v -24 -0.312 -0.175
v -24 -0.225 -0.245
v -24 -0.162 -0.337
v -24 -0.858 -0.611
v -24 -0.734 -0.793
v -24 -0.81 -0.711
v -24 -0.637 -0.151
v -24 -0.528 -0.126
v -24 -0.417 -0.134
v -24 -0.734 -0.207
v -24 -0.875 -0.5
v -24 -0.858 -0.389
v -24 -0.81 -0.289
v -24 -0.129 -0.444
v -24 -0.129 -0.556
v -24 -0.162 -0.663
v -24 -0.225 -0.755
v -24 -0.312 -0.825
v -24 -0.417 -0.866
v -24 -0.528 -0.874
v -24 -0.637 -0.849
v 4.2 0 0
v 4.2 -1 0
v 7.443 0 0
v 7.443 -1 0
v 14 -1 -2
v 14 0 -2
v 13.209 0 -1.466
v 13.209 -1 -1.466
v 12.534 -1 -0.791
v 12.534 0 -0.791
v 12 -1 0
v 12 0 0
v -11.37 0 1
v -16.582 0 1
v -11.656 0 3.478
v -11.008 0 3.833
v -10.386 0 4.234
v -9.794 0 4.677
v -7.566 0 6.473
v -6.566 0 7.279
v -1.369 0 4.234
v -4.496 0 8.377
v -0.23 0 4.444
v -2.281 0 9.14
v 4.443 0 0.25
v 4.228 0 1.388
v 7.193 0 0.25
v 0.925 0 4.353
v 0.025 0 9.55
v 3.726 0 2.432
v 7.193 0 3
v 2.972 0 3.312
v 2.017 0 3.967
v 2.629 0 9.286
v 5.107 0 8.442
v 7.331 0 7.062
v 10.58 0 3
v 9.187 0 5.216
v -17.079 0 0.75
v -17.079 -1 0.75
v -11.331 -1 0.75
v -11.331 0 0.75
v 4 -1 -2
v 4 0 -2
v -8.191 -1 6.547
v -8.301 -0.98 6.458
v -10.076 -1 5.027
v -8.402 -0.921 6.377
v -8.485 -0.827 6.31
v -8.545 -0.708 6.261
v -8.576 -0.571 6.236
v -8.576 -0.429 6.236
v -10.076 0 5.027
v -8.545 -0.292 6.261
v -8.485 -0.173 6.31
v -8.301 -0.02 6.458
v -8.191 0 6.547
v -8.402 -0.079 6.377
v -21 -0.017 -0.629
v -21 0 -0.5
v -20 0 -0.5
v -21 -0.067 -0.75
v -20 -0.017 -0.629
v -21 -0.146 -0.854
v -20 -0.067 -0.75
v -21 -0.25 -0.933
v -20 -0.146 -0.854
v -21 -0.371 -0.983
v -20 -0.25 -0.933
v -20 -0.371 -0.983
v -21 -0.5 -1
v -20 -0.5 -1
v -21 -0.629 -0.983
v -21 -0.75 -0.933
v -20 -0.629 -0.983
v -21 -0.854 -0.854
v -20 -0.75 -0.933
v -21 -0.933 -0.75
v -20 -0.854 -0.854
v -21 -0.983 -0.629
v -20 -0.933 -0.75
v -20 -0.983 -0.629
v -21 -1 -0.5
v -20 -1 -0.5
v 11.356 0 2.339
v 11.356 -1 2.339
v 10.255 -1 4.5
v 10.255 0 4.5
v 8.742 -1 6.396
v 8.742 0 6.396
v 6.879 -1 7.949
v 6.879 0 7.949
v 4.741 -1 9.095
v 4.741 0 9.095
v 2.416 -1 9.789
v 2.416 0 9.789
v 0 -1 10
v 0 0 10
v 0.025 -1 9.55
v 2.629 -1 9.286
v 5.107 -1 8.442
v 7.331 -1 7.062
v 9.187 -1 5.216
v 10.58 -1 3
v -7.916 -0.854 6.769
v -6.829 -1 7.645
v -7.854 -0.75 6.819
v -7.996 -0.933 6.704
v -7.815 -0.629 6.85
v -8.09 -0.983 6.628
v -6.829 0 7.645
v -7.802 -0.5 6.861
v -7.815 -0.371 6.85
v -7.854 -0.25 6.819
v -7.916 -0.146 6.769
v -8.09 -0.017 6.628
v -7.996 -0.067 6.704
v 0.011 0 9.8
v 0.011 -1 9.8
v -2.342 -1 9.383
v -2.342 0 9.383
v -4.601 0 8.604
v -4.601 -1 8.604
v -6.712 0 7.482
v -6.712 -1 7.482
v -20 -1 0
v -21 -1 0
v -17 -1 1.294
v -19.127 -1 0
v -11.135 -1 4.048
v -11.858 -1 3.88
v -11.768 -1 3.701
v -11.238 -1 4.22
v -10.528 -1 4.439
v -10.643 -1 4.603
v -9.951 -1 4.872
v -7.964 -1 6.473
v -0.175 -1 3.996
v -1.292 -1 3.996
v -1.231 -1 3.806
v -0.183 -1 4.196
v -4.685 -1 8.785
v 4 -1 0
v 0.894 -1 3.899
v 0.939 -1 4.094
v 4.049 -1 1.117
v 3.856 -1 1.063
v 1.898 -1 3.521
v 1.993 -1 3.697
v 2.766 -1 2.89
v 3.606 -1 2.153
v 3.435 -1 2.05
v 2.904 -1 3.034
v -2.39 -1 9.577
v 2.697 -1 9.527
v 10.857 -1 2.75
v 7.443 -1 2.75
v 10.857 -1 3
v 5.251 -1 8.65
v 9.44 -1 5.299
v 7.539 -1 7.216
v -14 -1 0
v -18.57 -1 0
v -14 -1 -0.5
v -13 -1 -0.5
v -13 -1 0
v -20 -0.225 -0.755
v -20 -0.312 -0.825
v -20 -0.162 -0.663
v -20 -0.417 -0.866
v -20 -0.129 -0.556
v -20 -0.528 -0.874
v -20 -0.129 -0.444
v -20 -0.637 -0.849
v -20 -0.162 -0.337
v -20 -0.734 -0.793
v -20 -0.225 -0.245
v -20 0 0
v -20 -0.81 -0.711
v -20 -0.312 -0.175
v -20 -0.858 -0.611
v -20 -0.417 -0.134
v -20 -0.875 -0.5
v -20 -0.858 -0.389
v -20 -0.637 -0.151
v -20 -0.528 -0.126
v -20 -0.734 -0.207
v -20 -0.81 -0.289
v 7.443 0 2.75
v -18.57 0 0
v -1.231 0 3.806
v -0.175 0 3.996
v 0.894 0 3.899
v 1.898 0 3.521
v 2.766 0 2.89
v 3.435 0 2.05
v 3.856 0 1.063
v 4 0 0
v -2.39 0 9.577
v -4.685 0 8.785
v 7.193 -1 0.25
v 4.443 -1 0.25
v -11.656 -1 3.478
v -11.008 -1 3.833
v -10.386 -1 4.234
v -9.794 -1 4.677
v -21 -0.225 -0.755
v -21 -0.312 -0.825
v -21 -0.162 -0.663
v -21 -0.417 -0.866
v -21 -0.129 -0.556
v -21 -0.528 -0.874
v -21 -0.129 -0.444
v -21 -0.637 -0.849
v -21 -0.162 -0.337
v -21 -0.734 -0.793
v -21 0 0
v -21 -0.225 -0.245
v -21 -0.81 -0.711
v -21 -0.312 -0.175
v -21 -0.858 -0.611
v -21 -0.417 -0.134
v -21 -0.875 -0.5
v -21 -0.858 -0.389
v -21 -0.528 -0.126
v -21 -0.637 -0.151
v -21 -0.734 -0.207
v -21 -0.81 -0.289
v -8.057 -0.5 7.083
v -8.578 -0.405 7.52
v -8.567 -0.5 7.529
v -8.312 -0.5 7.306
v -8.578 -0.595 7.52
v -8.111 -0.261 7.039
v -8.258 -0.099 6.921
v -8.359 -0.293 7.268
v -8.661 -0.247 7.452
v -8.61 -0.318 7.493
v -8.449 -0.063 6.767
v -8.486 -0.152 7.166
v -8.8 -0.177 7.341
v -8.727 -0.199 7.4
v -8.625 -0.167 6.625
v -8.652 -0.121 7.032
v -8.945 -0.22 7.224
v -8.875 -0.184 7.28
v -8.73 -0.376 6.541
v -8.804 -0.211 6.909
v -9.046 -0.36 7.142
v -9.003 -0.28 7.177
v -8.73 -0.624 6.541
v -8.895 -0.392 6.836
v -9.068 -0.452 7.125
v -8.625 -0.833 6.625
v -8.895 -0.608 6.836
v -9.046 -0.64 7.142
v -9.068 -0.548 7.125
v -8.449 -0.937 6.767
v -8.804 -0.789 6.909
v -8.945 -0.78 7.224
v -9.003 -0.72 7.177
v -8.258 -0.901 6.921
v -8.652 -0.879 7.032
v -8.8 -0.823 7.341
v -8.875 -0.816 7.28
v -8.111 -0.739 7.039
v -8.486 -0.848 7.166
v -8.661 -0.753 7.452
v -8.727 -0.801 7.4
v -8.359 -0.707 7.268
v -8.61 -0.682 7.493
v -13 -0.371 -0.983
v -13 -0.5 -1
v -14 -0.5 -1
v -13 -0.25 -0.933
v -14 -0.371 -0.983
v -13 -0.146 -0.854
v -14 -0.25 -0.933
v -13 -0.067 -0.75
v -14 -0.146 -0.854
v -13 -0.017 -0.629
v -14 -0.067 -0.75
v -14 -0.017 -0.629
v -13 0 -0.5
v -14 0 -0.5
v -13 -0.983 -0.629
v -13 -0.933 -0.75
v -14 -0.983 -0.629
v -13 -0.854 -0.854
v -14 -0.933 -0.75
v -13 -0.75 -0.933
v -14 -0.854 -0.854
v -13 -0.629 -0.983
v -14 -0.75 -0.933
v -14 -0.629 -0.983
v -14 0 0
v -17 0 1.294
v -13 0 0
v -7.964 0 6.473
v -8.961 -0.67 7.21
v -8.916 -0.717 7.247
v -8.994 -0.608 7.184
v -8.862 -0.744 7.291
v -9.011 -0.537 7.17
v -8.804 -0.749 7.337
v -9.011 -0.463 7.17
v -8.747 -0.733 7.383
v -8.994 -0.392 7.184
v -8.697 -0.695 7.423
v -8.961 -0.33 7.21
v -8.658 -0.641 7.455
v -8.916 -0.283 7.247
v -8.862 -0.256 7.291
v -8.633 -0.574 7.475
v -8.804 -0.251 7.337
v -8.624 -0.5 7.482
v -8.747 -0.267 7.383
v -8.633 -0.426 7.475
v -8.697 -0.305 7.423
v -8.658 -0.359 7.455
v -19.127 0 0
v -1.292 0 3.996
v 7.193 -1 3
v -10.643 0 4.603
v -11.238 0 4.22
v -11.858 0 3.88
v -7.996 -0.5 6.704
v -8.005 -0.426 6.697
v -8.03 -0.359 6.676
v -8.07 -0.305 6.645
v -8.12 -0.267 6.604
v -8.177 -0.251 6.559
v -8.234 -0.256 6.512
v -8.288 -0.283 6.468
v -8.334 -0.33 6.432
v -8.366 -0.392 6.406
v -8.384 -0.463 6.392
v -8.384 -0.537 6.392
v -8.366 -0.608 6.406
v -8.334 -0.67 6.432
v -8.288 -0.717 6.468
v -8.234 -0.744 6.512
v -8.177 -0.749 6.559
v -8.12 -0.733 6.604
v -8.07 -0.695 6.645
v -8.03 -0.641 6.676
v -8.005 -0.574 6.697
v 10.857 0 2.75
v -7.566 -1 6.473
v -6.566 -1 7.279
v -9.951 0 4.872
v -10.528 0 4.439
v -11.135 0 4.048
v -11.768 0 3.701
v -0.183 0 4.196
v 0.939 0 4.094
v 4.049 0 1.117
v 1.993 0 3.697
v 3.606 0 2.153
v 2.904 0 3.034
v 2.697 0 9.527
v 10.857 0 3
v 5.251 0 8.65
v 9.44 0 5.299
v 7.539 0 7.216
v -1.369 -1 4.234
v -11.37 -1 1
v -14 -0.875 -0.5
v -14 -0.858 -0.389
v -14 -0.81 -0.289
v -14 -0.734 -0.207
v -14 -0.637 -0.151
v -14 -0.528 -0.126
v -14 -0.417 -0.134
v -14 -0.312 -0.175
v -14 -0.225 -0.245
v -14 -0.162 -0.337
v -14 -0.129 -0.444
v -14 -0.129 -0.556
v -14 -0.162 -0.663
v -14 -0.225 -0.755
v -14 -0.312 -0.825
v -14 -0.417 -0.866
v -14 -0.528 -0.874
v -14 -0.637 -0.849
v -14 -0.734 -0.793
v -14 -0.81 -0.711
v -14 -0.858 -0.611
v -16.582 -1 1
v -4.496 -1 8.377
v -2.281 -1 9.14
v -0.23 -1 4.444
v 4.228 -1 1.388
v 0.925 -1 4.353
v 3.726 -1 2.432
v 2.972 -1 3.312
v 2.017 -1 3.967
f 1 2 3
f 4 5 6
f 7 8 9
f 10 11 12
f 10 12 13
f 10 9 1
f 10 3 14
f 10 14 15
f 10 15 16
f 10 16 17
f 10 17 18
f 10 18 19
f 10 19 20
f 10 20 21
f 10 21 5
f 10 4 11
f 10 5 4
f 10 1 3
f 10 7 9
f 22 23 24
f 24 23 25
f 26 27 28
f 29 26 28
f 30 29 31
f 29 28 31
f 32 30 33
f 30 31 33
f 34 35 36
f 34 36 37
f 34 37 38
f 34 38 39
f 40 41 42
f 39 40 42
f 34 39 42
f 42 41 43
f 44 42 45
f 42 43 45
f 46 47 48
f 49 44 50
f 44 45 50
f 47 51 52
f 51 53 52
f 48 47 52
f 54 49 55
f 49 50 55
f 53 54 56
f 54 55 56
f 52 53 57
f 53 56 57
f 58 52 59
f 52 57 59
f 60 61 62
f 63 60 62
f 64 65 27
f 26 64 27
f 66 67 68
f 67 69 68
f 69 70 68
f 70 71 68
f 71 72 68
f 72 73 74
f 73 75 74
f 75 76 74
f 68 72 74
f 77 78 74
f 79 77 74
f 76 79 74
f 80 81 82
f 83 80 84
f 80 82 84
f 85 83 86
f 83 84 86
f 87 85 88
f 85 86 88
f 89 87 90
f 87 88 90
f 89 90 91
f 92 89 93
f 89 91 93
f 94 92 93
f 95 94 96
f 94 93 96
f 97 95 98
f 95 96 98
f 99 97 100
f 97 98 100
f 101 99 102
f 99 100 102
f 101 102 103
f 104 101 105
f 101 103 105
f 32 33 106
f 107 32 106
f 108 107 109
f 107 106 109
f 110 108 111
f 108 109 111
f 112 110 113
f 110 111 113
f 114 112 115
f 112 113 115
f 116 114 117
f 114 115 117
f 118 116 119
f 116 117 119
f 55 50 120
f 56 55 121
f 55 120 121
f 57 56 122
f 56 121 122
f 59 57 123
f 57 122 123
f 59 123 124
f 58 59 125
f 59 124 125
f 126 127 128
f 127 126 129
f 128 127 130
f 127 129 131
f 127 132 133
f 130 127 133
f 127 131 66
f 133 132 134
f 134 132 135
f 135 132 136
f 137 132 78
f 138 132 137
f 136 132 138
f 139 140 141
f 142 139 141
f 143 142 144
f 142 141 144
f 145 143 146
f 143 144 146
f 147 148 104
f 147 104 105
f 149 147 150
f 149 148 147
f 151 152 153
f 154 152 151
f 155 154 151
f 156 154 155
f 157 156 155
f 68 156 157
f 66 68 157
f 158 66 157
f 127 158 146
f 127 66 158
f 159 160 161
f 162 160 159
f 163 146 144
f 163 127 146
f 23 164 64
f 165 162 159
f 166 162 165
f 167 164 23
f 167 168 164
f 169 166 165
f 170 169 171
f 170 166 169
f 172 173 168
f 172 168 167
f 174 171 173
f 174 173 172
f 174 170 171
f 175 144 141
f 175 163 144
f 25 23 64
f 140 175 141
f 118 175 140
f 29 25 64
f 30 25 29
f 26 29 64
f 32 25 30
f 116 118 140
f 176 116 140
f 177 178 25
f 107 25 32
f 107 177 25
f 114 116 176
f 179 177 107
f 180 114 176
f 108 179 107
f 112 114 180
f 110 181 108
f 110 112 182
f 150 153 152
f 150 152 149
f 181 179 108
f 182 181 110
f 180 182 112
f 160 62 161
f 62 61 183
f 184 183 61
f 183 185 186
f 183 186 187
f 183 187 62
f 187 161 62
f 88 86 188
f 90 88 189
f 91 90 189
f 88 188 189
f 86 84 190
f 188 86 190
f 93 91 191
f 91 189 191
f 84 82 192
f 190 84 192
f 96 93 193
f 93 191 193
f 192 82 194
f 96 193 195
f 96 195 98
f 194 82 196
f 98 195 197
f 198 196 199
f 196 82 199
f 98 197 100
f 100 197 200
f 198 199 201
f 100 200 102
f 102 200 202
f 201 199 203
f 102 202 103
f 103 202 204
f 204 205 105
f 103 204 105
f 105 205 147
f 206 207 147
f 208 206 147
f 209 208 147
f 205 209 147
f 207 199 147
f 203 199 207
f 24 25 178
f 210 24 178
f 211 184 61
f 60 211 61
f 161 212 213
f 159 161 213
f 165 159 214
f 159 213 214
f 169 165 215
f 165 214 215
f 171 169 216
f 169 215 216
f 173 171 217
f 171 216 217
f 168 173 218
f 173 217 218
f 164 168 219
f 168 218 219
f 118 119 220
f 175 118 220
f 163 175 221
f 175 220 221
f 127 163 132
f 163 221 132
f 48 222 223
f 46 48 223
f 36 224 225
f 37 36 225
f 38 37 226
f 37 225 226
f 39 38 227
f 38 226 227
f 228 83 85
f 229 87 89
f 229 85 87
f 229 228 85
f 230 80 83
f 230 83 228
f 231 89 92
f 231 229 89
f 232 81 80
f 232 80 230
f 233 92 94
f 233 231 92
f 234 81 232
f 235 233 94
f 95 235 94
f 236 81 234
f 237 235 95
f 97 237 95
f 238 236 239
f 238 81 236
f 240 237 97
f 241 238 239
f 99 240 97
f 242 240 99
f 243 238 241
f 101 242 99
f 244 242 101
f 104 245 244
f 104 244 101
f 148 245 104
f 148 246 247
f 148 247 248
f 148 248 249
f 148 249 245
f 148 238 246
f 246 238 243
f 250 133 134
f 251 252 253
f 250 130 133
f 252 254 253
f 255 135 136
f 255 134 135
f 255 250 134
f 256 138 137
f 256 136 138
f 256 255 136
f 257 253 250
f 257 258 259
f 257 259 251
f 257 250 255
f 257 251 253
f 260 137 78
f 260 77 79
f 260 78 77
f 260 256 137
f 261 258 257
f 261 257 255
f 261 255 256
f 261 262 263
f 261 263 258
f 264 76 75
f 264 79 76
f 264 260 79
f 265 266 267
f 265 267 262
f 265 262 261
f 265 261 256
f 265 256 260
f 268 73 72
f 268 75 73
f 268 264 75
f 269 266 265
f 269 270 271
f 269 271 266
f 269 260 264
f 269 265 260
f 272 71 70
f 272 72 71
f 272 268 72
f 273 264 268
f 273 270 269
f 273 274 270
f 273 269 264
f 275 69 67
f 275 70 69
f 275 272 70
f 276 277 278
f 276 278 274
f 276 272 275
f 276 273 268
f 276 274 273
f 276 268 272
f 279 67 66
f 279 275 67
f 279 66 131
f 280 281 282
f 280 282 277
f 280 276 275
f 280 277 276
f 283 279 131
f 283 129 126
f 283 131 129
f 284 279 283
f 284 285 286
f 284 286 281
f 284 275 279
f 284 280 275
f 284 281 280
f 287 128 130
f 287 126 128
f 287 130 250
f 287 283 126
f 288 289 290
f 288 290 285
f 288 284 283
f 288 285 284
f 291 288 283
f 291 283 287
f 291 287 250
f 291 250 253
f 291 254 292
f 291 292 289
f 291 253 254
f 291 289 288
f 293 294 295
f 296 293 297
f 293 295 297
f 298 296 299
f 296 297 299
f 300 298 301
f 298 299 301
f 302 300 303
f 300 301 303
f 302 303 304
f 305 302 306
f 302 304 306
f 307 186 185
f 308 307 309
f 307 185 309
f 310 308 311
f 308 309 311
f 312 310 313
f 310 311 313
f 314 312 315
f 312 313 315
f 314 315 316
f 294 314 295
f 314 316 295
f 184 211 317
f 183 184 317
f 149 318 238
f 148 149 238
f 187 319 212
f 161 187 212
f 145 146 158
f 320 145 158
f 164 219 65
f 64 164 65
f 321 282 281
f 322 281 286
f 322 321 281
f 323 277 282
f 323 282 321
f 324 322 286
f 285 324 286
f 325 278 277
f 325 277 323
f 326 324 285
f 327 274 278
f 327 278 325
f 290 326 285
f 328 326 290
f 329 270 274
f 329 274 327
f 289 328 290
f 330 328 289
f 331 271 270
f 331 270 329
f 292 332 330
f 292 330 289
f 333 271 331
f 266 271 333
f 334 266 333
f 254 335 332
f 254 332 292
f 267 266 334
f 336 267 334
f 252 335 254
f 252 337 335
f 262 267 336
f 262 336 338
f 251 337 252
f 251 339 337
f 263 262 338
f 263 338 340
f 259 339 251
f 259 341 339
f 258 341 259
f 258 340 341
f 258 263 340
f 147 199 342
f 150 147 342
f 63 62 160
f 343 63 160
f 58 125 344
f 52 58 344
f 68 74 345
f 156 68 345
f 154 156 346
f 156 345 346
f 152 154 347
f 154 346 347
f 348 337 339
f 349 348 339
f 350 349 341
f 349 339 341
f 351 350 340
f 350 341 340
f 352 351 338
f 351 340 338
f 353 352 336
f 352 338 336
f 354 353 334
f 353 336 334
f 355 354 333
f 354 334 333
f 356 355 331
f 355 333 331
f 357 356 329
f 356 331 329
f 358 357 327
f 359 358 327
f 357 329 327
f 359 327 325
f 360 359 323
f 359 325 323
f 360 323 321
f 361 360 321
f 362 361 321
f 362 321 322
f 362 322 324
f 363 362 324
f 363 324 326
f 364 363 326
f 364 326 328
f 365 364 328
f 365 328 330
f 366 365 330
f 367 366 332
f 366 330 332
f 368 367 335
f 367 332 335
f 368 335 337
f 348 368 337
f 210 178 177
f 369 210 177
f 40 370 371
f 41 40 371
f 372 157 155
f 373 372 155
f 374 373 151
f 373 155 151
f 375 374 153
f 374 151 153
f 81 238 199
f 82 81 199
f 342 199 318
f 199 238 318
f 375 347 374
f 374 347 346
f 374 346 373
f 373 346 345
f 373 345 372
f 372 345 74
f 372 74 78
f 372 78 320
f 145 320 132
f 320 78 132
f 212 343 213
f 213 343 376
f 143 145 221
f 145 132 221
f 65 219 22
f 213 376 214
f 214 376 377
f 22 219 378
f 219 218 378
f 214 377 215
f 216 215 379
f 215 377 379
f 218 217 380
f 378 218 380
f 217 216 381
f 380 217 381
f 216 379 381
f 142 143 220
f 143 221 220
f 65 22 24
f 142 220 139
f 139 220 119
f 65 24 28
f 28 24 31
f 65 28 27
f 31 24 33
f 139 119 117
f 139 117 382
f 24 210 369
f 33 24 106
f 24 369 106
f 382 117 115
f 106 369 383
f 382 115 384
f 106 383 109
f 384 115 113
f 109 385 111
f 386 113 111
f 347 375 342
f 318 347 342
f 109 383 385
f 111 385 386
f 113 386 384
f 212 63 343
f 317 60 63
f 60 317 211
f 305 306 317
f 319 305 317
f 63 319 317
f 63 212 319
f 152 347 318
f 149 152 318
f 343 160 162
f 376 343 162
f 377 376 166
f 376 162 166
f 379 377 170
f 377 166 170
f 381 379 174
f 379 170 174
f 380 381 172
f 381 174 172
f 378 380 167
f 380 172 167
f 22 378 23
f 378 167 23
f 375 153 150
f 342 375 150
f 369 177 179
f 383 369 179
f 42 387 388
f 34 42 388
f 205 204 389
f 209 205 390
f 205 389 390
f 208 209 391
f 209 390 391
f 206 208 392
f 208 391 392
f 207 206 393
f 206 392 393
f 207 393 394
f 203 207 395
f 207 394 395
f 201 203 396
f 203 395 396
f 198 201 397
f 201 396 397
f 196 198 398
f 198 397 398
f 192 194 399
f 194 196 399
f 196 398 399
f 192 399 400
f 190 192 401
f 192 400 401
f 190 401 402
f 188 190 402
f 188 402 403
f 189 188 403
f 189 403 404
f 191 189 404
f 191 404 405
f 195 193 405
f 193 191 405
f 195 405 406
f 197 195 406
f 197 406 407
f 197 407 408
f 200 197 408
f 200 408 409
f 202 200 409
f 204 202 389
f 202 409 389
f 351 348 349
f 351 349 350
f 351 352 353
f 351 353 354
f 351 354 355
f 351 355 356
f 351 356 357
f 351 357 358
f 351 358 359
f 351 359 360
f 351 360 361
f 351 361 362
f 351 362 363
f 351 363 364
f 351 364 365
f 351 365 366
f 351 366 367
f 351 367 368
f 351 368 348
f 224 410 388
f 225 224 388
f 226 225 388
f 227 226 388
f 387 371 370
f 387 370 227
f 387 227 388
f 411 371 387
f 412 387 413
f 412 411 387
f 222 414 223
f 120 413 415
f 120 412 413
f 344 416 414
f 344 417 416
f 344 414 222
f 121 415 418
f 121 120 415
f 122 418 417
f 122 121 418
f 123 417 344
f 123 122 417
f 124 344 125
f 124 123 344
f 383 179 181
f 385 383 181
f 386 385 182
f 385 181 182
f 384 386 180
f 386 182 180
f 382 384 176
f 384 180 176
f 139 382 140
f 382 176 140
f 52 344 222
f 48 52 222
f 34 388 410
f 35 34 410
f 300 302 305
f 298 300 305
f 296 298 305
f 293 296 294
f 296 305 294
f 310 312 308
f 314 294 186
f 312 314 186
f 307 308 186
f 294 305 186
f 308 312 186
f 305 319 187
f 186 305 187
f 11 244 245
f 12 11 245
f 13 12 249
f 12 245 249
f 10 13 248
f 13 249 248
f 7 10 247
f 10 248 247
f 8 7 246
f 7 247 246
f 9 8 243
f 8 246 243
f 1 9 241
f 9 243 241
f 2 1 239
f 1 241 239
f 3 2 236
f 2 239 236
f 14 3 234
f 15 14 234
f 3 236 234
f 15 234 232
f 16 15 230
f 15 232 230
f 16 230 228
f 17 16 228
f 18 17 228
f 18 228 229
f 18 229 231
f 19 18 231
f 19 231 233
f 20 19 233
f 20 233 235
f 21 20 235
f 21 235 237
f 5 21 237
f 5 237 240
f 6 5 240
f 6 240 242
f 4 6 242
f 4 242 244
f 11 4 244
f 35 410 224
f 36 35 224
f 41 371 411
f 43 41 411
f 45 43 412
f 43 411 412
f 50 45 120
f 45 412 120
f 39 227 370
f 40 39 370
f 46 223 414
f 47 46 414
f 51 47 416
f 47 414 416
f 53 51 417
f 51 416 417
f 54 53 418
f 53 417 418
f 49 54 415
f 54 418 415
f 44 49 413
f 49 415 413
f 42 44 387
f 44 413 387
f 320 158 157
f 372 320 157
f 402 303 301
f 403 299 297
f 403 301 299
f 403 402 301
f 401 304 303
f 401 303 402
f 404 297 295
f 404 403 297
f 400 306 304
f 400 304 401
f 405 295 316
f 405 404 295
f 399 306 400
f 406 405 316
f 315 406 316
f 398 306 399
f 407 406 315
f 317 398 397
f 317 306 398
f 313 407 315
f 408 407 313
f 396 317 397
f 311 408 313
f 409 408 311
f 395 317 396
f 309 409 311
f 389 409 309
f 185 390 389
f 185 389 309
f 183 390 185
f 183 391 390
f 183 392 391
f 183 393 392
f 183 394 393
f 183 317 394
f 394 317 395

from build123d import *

# Parameters (mm, degrees)
F1_DEPTH  = 1
F2_W      = 1
F2_H      = 1
F3_DEPTH  = 1
F5_DEPTH  = 1.1
F6_R      = 0.5
F7_DEPTH  = 10
F8_R      = 0.5
F9_DEPTH  = 1
F9_TAPER  = 10
F10_R     = 0.25
F11_DEPTH = 1
F13_R     = 0.375
F14_DEPTH = 10
F15_W     = 1
F15_H     = 1
F16_DEPTH = 1
F18_DEPTH = 25
F20_DEPTH = 20


with BuildPart() as f1:
    # F0 (on Front) → F1 (new body)
    with BuildSketch(Plane.XZ):
        with BuildLine():
            ThreePointArc((-1.2307692308, 3.8059436544), (2.3533936217, 3.2344301603), (4, 0))
            Line((4, 0), (4, -2))
            Line((4, -2), (14, -2))
            ThreePointArc((14, -2), (12.8556310856, -1.1443689144), (12, 0))
            ThreePointArc((12, 0), (7.8498553444, 7.2198264133), (0, 10))
            ThreePointArc((0, 10), (-3.55336543, 9.2258567783), (-6.8285443319, 7.6450636964))
            Line((-6.8285443319, 7.6450636964), (-10.0761376412, 5.0274618018))
            ThreePointArc((-10.0761376412, 5.0274618018), (-10.9367194729, 4.4061716306), (-11.8583053969, 3.8795959469))
            Line((-11.8583053969, 3.8795959469), (-17, 1.2935233335))
            Line((-17, 1.2935233335), (-21, 0))
            Line((-21, 0), (-13, 0))
            Line((-13, 0), (-1.2307692308, 3.8059436544))
        make_face()
    extrude(amount=F1_DEPTH)

    # F2 (on face) → F3 (join)
    with BuildSketch(Plane(origin=(0, 0, 0), x_dir=(1, 0, 0), z_dir=(0, 0, -1))):
        with Locations((-13.5, 0.5)):
            Rectangle(F2_W, F2_H)
    extrude(amount=F3_DEPTH)

    # F4 (on face) → F5 (cut)
    with BuildSketch(Plane(origin=(-14, 0, 0), x_dir=(0, -1, 0), z_dir=(-1, 0, 0))):
        with BuildLine():
            Line((0, -0.5), (0, 0))
            Line((0, 0), (-0.4260281858, 0))
            Line((-0.4260281858, 0), (-0.4260281858, -1))
            Line((-0.4260281858, -1), (0.5, -1.2644260423))
            Line((0.5, -1.2644260423), (1.4661723981, -1))
            Line((1.4661723981, -1), (1.4661723981, 0))
            Line((1.4661723981, 0), (1, 0))
            Line((1, 0), (1, -0.5))
            ThreePointArc((1, -0.5), (0.8535533906, -0.8535533906), (0.5, -1))
            ThreePointArc((0.5, -1), (0.1464466094, -0.8535533906), (0, -0.5))
        make_face()
    extrude(amount=-F5_DEPTH, mode=Mode.SUBTRACT)

    # F8 (on face) → F9 (join)
    with BuildSketch(Plane(origin=(-6.4245058064, 0, 7.9707239343), x_dir=(0.7785799461, 0, 0.6275454307), z_dir=(-0.6275454307, 0, 0.7785799461))):
        with Locations((-2.2689428876, -0.5)):
            Circle(F8_R)
    extrude(amount=F9_DEPTH, taper=F9_TAPER)

    # F10 (on face) → F11 (cut)
    with BuildSketch(Plane(origin=(-7.0520512371, 0, 8.7493038804), x_dir=(0.7785799461, 0, 0.6275454307), z_dir=(-0.6275454307, 0, 0.7785799461))):
        with Locations((-2.2689428876, -0.5)):
            Circle(F10_R)
    extrude(amount=-F11_DEPTH, mode=Mode.SUBTRACT)

    # F13 (on face) → F14 (join)
    with BuildSketch(Plane(origin=(-14, 0, 0), x_dir=(0, -1, 0), z_dir=(-1, 0, 0))):
        with Locations((0.5, -0.5)):
            Circle(F13_R)
    extrude(amount=F14_DEPTH)

    # F15 (on face) → F16 (join)
    with BuildSketch(Plane(origin=(0, 0, 0), x_dir=(1, 0, 0), z_dir=(0, 0, -1))):
        with Locations((-20.5, 0.5)):
            Rectangle(F15_W, F15_H)
    extrude(amount=F16_DEPTH)

    # F17 (on face) → F18 (cut)
    with BuildSketch(Plane.YZ.offset(-20)):
        with BuildLine():
            ThreePointArc((0, -0.5), (-0.1464466094, -0.8535533906), (-0.5, -1))
            Line((-0.5, -1), (0, -1))
            Line((0, -1), (0, -0.5))
        make_face()
        with BuildLine():
            ThreePointArc((-0.5, -1), (-0.8535533906, -0.8535533906), (-1, -0.5))
            Line((-1, -0.5), (-1, -1))
            Line((-1, -1), (-0.5, -1))
        make_face()
    extrude(amount=-F18_DEPTH, mode=Mode.SUBTRACT)

    # F19 (on face) → F20 (cut)
    with BuildSketch(Plane.XZ.offset(1)):
        with BuildLine():
            Line((-11.7684396659, 3.7009226406), (-19.1267071287, 0))
            Line((-19.1267071287, 0), (-18.5703215139, 0))
            Line((-18.5703215139, 0), (-17.0791526534, 0.75))
            Line((-17.0791526534, 0.75), (-11.3307530856, 0.75))
            Line((-11.3307530856, 0.75), (-1.2923076923, 3.9962408371))
            ThreePointArc((-1.2923076923, 3.9962408371), (2.4710633027, 3.3961516683), (4.2, 0))
            Line((4.2, 0), (7.4429719783, 0))
            Line((7.4429719783, 0), (7.4429719783, 2.75))
            Line((7.4429719783, 2.75), (10.8565016648, 2.75))
            Line((10.8565016648, 2.75), (10.8565016648, 3))
            ThreePointArc((10.8565016648, 3), (6.4360393371, 7.9985307946), (0.0110857368, 9.8001324516))
            ThreePointArc((0.0110857368, 9.8001324516), (-3.4868463955, 9.0372376485), (-6.7117250372, 7.4823436237))
            Line((-6.7117250372, 7.4823436237), (-7.9643731986, 6.4726931262))
            Line((-7.9643731986, 6.4726931262), (-9.950628555, 4.8717458125))
            ThreePointArc((-9.950628555, 4.8717458125), (-10.8284220234, 4.238029838), (-11.7684396659, 3.7009226406))
        make_face()
        with BuildLine():
            ThreePointArc((0.0249202776, 9.5502892216), (6.2579782939, 7.8149527201), (10.5798569724, 3))
            Line((10.5798569724, 3), (7.1929719783, 3))
            Line((7.1929719783, 3), (7.1929719783, 0.25))
            Line((7.1929719783, 0.25), (4.4429719783, 0.25))
            ThreePointArc((4.4429719783, 0.25), (2.5160005944, 3.6704551501), (-1.3692307692, 4.2341123155))
            Line((-1.3692307692, 4.2341123155), (-11.3701707808, 1))
            Line((-11.3701707808, 1), (-16.5820963665, 1))
            Line((-16.5820963665, 1), (-11.6561075021, 3.4775810077))
            ThreePointArc((-11.6561075021, 3.4775810077), (-10.6930502115, 4.0278525972), (-9.7937421974, 4.677100826))
            Line((-9.7937421974, 4.677100826), (-7.5659956664, 6.4726931262))
            Line((-7.5659956664, 6.4726931262), (-6.5657814379, 7.2788786335))
            ThreePointArc((-6.5657814379, 7.2788786335), (-3.4037571753, 8.8014430117), (0.0249202776, 9.5502892216))
        make_face(mode=Mode.SUBTRACT)
    extrude(amount=-F20_DEPTH, mode=Mode.SUBTRACT)


with BuildPart() as f7:
    # F6 (on face) → F7 (new body)
    with BuildSketch(Plane(origin=(-14, 0, 0), x_dir=(0, -1, 0), z_dir=(-1, 0, 0))):
        with Locations((0.5, -0.5)):
            Circle(F6_R)
    extrude(amount=F7_DEPTH)


solid = f1.part
